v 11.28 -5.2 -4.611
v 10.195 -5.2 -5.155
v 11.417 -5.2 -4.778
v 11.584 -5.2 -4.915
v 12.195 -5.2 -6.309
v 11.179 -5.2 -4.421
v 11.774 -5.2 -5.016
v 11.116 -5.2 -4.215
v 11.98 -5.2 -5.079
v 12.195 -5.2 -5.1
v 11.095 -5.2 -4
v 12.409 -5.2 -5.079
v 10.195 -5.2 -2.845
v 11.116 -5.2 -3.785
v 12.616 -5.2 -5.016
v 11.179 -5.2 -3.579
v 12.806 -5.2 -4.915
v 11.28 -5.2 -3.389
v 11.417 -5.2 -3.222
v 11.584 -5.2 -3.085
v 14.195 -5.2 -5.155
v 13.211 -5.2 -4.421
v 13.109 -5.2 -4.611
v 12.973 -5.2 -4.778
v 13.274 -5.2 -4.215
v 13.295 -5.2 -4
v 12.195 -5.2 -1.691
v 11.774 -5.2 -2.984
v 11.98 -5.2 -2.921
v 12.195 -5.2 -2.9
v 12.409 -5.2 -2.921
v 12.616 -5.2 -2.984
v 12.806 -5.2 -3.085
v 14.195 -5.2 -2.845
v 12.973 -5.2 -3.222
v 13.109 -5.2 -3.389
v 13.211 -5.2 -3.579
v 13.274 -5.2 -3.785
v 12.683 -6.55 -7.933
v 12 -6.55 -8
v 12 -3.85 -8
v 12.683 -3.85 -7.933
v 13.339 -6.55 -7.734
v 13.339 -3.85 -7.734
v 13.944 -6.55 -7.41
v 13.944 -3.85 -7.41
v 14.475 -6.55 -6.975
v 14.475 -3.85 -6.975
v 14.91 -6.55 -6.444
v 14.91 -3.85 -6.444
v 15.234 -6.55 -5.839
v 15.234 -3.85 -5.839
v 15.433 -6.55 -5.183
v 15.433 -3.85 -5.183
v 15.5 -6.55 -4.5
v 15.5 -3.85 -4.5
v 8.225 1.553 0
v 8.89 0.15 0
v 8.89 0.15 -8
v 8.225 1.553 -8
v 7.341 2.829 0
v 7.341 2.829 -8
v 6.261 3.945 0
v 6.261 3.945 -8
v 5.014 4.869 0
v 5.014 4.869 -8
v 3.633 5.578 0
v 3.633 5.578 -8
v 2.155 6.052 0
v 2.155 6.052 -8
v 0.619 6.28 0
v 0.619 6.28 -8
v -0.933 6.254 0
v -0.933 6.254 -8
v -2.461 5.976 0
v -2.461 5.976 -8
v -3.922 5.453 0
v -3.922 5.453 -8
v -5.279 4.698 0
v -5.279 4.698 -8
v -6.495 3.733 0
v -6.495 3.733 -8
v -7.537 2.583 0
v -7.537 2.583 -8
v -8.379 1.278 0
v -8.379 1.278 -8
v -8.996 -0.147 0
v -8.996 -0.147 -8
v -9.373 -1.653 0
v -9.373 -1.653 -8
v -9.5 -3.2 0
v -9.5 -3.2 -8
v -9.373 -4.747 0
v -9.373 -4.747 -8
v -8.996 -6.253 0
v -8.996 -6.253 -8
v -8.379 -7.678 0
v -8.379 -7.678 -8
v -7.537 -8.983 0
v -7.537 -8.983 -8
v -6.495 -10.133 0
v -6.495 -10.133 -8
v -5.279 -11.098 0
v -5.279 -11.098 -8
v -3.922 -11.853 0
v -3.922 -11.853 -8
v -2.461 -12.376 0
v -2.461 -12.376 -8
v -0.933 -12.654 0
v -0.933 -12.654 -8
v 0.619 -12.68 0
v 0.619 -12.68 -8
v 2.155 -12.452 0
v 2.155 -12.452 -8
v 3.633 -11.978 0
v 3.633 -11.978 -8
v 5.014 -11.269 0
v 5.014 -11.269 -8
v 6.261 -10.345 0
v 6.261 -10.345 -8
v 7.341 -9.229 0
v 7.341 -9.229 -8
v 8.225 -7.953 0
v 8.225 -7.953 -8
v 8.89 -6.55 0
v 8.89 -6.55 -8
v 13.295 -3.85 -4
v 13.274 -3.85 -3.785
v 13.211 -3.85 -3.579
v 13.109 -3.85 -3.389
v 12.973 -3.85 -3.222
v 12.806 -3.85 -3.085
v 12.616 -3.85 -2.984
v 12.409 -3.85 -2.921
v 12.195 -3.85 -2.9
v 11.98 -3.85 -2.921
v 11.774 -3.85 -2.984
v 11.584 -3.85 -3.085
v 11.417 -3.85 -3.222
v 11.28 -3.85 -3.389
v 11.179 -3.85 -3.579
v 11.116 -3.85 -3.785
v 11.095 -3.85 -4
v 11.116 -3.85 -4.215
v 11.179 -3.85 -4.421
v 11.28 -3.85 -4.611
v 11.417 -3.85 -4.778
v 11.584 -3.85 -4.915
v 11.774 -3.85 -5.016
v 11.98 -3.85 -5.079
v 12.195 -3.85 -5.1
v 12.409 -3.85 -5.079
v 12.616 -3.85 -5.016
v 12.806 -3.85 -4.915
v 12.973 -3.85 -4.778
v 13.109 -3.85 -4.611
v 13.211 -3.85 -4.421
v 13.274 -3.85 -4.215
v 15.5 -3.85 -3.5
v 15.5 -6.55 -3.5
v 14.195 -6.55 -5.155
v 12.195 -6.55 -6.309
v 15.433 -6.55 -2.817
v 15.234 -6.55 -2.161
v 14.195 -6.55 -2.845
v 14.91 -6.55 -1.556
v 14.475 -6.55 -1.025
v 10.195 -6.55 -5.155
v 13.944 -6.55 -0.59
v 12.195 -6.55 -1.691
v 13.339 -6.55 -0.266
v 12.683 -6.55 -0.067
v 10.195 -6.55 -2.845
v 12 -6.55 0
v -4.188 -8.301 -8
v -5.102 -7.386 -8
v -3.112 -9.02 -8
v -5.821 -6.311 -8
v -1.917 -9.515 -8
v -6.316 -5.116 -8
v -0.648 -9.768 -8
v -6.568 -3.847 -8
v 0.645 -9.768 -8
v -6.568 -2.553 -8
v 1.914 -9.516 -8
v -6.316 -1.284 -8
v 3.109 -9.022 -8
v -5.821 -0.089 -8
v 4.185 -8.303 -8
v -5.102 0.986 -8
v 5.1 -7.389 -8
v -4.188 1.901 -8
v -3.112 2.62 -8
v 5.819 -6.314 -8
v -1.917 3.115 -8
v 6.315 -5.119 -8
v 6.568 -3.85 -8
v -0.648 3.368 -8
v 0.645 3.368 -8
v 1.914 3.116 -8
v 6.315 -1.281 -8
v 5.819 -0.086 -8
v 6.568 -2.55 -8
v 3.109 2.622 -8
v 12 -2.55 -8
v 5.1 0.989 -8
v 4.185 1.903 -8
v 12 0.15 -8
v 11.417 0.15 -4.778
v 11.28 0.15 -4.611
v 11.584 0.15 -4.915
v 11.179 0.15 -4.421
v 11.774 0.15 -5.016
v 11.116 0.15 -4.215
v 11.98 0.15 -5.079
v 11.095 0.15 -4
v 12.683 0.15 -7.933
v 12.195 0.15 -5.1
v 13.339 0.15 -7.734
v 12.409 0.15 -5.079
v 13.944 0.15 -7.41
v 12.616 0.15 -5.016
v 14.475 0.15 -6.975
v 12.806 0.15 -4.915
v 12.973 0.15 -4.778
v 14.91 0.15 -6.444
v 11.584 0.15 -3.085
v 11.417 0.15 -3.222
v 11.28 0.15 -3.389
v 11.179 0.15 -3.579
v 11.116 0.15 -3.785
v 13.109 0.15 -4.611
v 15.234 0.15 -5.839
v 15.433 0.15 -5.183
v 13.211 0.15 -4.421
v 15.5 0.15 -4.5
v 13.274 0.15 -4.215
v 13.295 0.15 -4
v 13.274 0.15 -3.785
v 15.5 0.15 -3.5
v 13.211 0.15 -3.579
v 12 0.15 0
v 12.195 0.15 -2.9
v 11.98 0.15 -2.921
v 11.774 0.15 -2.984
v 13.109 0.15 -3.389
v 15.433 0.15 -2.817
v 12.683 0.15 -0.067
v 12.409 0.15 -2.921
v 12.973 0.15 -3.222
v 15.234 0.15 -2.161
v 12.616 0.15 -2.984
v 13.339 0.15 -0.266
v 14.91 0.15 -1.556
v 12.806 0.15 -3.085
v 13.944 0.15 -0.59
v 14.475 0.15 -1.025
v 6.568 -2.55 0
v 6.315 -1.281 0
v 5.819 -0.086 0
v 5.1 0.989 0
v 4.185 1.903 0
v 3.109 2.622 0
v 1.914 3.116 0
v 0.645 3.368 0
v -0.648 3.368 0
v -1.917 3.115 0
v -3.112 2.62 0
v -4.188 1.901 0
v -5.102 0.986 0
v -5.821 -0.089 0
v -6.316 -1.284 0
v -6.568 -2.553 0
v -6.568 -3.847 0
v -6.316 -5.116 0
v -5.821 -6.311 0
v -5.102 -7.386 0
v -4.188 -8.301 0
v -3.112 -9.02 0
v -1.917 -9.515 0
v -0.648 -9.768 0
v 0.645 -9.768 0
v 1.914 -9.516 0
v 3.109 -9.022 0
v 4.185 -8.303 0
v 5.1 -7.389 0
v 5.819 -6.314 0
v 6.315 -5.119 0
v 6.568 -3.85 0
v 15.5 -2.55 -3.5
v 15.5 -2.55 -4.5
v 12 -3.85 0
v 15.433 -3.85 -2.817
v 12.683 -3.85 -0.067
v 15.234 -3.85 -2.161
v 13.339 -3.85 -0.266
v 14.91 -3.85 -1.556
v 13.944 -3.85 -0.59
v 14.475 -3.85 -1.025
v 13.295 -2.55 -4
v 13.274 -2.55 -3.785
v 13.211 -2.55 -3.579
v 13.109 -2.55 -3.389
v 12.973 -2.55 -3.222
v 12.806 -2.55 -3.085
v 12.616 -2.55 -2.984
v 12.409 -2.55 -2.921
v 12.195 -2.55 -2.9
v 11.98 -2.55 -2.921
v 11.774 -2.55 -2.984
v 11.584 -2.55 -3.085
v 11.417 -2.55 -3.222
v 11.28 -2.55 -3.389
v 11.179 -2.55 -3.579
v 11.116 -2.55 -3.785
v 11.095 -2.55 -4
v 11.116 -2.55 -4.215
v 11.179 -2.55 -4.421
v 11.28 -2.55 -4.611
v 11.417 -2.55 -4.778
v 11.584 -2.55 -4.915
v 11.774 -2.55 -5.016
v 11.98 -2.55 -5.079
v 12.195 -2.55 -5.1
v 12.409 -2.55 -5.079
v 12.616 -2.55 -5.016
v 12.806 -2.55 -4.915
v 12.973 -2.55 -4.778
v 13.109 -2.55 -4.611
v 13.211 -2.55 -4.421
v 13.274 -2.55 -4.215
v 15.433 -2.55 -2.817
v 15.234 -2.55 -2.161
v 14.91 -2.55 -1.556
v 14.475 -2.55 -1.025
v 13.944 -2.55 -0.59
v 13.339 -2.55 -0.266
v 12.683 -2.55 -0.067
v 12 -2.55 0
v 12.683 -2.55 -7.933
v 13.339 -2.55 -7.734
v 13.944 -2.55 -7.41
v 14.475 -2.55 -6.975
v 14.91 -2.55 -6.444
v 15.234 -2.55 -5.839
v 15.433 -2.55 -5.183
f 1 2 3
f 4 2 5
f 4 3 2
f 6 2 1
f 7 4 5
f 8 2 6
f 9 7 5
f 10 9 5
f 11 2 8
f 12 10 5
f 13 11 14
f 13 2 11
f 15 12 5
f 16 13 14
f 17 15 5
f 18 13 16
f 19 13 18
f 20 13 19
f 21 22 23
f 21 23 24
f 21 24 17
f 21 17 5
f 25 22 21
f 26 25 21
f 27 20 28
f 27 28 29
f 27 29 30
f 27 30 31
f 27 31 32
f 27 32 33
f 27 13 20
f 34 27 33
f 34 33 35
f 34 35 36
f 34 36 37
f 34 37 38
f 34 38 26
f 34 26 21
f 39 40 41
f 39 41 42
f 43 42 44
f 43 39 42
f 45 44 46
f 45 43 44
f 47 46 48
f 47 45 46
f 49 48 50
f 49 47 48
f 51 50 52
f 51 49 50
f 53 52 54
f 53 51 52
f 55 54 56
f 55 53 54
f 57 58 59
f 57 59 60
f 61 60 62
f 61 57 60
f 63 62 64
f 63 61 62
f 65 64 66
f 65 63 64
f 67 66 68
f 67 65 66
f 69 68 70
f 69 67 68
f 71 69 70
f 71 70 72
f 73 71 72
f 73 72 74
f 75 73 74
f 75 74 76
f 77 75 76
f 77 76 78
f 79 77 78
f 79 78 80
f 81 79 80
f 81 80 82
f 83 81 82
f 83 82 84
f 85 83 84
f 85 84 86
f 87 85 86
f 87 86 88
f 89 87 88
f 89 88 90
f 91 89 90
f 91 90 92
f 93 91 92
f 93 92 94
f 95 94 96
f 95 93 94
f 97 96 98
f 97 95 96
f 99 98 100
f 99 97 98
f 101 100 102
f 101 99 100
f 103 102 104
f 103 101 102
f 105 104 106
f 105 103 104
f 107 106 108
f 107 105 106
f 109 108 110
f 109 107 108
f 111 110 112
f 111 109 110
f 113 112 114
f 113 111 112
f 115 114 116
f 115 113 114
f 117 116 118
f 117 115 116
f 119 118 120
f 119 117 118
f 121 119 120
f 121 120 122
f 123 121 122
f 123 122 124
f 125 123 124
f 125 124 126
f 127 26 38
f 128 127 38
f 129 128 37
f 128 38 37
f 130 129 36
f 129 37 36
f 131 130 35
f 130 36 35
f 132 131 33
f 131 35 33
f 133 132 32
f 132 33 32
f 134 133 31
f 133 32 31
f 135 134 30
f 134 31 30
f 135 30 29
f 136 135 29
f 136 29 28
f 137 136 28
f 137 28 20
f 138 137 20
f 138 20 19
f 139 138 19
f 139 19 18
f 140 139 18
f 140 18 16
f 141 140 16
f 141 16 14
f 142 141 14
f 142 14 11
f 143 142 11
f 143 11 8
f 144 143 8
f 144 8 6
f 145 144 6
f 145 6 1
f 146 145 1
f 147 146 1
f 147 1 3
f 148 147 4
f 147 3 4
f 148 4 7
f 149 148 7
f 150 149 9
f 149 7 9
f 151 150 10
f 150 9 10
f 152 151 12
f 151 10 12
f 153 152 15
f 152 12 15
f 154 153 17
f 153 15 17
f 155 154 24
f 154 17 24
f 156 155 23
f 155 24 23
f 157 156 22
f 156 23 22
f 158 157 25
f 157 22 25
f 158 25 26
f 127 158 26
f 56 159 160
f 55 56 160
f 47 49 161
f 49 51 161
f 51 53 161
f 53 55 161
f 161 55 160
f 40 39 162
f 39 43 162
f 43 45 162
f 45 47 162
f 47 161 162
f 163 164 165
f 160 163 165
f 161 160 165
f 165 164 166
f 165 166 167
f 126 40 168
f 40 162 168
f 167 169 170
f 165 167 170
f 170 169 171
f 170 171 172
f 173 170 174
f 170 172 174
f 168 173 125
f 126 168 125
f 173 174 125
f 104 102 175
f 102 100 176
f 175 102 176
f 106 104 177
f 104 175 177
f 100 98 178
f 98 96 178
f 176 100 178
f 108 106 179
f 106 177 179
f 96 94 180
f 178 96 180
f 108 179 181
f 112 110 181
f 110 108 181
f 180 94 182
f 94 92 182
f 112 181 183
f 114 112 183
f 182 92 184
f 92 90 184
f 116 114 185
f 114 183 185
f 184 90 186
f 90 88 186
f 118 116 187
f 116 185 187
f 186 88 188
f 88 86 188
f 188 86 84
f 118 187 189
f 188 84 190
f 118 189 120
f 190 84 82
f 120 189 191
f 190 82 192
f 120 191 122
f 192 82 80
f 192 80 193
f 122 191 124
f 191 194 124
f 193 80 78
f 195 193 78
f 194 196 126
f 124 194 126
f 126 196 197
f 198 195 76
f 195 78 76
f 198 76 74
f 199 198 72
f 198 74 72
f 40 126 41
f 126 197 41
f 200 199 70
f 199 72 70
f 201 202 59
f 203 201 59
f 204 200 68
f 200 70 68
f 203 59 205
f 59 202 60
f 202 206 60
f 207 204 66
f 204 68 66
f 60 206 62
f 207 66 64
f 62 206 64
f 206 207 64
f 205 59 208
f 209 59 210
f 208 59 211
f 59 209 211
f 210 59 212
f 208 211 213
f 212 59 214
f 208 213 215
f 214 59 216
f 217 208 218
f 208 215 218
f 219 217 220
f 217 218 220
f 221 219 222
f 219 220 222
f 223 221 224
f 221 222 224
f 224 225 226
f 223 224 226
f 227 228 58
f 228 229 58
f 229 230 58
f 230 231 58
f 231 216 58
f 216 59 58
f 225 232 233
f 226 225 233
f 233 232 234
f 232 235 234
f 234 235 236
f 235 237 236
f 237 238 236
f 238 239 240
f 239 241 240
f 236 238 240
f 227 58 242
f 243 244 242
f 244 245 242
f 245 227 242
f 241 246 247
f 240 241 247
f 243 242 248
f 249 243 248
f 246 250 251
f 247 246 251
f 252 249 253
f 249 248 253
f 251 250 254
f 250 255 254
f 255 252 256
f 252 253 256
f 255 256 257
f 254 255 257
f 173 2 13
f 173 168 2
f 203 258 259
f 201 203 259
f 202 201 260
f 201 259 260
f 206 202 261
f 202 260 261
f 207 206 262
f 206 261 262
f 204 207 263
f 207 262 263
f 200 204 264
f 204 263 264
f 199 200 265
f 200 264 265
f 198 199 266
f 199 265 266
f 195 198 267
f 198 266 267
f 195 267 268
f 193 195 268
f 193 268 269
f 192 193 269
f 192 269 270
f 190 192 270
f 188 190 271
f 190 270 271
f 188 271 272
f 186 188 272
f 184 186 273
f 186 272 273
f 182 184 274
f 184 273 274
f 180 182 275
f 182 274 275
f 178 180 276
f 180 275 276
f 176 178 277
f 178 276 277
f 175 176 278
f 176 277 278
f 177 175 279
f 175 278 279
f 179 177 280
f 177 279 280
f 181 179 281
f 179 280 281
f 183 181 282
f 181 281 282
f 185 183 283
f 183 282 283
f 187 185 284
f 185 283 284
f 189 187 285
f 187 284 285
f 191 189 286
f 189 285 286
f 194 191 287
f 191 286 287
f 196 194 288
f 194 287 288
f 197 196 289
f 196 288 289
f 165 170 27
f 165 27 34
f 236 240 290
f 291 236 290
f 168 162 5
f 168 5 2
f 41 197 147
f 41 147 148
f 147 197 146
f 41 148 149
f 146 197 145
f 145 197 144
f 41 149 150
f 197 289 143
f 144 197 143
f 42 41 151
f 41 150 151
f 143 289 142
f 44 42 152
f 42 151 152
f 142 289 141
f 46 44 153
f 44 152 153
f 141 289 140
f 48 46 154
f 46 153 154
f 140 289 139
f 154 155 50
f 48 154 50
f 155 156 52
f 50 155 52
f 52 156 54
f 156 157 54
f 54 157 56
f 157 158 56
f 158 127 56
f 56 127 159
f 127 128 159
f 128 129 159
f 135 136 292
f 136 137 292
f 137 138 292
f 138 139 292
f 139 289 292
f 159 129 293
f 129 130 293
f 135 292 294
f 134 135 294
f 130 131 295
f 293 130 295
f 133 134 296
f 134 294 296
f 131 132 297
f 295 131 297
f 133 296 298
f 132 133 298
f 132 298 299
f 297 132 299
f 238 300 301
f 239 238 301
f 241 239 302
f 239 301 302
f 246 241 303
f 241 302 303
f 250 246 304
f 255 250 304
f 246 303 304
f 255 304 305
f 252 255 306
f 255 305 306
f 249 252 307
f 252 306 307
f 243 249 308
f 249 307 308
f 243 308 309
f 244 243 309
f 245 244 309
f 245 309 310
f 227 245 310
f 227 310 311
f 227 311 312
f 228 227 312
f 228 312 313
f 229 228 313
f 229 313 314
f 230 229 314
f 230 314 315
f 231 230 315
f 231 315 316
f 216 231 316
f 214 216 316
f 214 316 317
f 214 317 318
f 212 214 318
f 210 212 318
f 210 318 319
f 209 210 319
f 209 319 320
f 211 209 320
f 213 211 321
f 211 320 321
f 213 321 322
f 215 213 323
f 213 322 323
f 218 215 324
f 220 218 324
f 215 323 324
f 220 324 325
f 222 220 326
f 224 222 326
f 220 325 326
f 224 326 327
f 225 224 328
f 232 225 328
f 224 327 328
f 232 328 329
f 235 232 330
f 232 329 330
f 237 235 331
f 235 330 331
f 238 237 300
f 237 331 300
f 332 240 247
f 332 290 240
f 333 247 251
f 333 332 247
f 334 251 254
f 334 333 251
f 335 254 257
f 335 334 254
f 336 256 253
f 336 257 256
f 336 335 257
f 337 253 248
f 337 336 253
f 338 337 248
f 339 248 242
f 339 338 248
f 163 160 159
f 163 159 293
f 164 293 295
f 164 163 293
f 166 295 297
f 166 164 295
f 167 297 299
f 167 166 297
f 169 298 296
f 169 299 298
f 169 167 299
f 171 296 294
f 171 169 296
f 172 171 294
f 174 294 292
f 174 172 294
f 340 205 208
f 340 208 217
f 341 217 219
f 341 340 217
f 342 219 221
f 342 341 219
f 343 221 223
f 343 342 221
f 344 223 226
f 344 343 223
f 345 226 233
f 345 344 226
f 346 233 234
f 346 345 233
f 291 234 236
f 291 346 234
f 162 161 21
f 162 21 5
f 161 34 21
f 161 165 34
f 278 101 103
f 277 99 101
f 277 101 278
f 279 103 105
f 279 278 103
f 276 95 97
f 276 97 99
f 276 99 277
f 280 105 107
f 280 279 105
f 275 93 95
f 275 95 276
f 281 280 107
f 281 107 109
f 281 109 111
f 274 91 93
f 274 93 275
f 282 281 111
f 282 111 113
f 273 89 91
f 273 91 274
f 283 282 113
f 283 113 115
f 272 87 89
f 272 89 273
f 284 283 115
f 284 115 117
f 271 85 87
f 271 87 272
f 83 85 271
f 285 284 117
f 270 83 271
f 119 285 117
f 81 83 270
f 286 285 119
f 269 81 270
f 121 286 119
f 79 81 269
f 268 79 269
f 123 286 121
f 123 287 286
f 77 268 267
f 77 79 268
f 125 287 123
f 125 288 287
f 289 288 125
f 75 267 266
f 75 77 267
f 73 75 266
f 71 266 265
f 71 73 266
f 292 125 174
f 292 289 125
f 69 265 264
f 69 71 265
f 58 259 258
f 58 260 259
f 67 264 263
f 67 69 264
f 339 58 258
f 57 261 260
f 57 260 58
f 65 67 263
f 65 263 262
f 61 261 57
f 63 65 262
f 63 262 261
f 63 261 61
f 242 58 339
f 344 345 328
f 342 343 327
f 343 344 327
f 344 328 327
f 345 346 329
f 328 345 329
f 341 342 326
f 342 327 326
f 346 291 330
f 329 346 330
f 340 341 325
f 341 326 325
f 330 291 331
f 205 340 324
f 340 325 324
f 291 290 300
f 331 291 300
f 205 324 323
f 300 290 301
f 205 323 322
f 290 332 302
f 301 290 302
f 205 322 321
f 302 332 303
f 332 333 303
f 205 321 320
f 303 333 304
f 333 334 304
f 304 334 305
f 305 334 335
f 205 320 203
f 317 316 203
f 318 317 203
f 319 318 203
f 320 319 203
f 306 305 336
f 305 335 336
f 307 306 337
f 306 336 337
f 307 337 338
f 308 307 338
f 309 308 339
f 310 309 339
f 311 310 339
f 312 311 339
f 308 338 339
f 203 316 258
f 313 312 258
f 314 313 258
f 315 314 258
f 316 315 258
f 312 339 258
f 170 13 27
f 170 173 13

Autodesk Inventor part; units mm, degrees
ref_plane "YZ Plane" through (0, 0, 0) normal (1, 0, 0) x (0, 1, 0)
ref_plane "XZ Plane" through (0, 0, 0) normal (0, 1, 0) x (-1, 0, 0)
ref_plane "XY Plane" through (0, 0, 0) normal (0, 0, 1) x (1, 0, 0)
sketch "Boceto1" plane through (0, 0, 0) normal (0, 0, 1) x (1, 0, 0)
  circle A0 centre (0, -3.2) radius 3.2 projected
  circle A1 centre (0, -3.2) radius 6.5 projected
  circle A2 centre (0, -3.2) radius 9.5
  circle A3 centre (0, -3.2) radius 6.6
  line L0 (5.5183, 0.15) -> (15.5, 0.15)
  line L1 (15.5, 0.15) -> (15.5, -2.55)
  line L2 (15.5, -2.55) -> (5.5183, -2.55)
  line L3 (5.5183, -2.55) -> (5.5183, 0.15)
  line L4 (5.5183, -3.85) -> (15.5, -3.85)
  line L5 (15.5, -3.85) -> (15.5, -6.55)
  line L6 (15.5, -6.55) -> (5.5183, -6.55)
  line L7 (5.5183, -6.55) -> (5.5183, -3.85)
  line L8 (0, -3.2) -> (15.5144, -3.2)
  line L9 (9.5, -3.2) -> (9.5, 8.1404)
  arc A4 (9.2965, -1.2441) -> (-9.2965, -1.2441) centre (0, -3.2) ccw projected
  point P0 (0, 0)
  point P1 (8.8897, 0.15)
  point P2 (8.8897, -6.55)
  point P3 (6.4674, -3.85)
  point P4 (5.5702, -6.55)
  point P5 (5.6866, -6.55)
  point P6 (6.5679, -2.55)
  point P7 (6.5679, -3.85)
  dimension "d0" = 0.1
  dimension "d1" = 6
  dimension "d2" = 1.3
  dimension "d3" = 2.7
extrude "Extrusión1" add sketch "Boceto1" against normal blind 8 contours A3 L0 A2 L2 | L4 A2 L6 A3 | A3 L6 A2 L0 | A2 L0 L9 L2 | L4 L5 L6 A2 | L9 L0 L1 L2
sketch "Boceto2" plane through (8.8897, -6.55, 0) normal (0, -1, 0) x (1, 0, 0)
  line L0 (0, 0) -> (6.6103, 0) projected
  line L1 (0, 0) -> (0, -8) projected
  line L2 (6.6103, -8) -> (0, -8) projected
  line L3 (6.6103, 0) -> (6.6103, -8) projected
  line L4 (0, 0) -> (0, -8) projected
  line L5 (6.6103, 0) -> (6.6103, -8) projected
  line L6 (0, 0) -> (6.6103, -8)
  line L7 (1.3051, -2.8453) -> (3.3051, -1.6906)
  line L8 (3.3051, -1.6906) -> (5.3051, -2.8453)
  line L9 (5.3051, -2.8453) -> (5.3051, -5.1547)
  line L10 (5.3051, -5.1547) -> (3.3051, -6.3094)
  line L11 (3.3051, -6.3094) -> (1.3051, -5.1547)
  line L12 (1.3051, -5.1547) -> (1.3051, -2.8453)
  point P0 (-8.8897, 0)
  point P1 (3.3051, -4)
  dimension "d6" = 4
extrude "Extrusión2" cut sketch "Boceto2" against normal blind 1.35 contours L7 L8 L9 L10 L6 | L6 L10 L11 L12 L7
sketch "Boceto3" plane through (8.8897, -5.2, 0) normal (0, -1, 0) x (1, 0, 0)
  line L0 (3.3051, -6.3094) -> (1.3051, -5.1547) projected
  line L1 (5.3051, -2.8453) -> (1.3051, -5.1547)
  circle A0 centre (3.3051, -4) radius 1.1
  point P0 (-8.8897, 0)
  dimension "d9" = 2.2
extrude "Extrusión3" cut sketch "Boceto3" against normal through all
fillet "Empalme1" radius 3.5 4 edges at (15.5, -1.2, -8) (15.5, -5.2, -8) (15.5, -5.2, 0) (15.5, -1.2, 0)
properties part number "Cierre"
